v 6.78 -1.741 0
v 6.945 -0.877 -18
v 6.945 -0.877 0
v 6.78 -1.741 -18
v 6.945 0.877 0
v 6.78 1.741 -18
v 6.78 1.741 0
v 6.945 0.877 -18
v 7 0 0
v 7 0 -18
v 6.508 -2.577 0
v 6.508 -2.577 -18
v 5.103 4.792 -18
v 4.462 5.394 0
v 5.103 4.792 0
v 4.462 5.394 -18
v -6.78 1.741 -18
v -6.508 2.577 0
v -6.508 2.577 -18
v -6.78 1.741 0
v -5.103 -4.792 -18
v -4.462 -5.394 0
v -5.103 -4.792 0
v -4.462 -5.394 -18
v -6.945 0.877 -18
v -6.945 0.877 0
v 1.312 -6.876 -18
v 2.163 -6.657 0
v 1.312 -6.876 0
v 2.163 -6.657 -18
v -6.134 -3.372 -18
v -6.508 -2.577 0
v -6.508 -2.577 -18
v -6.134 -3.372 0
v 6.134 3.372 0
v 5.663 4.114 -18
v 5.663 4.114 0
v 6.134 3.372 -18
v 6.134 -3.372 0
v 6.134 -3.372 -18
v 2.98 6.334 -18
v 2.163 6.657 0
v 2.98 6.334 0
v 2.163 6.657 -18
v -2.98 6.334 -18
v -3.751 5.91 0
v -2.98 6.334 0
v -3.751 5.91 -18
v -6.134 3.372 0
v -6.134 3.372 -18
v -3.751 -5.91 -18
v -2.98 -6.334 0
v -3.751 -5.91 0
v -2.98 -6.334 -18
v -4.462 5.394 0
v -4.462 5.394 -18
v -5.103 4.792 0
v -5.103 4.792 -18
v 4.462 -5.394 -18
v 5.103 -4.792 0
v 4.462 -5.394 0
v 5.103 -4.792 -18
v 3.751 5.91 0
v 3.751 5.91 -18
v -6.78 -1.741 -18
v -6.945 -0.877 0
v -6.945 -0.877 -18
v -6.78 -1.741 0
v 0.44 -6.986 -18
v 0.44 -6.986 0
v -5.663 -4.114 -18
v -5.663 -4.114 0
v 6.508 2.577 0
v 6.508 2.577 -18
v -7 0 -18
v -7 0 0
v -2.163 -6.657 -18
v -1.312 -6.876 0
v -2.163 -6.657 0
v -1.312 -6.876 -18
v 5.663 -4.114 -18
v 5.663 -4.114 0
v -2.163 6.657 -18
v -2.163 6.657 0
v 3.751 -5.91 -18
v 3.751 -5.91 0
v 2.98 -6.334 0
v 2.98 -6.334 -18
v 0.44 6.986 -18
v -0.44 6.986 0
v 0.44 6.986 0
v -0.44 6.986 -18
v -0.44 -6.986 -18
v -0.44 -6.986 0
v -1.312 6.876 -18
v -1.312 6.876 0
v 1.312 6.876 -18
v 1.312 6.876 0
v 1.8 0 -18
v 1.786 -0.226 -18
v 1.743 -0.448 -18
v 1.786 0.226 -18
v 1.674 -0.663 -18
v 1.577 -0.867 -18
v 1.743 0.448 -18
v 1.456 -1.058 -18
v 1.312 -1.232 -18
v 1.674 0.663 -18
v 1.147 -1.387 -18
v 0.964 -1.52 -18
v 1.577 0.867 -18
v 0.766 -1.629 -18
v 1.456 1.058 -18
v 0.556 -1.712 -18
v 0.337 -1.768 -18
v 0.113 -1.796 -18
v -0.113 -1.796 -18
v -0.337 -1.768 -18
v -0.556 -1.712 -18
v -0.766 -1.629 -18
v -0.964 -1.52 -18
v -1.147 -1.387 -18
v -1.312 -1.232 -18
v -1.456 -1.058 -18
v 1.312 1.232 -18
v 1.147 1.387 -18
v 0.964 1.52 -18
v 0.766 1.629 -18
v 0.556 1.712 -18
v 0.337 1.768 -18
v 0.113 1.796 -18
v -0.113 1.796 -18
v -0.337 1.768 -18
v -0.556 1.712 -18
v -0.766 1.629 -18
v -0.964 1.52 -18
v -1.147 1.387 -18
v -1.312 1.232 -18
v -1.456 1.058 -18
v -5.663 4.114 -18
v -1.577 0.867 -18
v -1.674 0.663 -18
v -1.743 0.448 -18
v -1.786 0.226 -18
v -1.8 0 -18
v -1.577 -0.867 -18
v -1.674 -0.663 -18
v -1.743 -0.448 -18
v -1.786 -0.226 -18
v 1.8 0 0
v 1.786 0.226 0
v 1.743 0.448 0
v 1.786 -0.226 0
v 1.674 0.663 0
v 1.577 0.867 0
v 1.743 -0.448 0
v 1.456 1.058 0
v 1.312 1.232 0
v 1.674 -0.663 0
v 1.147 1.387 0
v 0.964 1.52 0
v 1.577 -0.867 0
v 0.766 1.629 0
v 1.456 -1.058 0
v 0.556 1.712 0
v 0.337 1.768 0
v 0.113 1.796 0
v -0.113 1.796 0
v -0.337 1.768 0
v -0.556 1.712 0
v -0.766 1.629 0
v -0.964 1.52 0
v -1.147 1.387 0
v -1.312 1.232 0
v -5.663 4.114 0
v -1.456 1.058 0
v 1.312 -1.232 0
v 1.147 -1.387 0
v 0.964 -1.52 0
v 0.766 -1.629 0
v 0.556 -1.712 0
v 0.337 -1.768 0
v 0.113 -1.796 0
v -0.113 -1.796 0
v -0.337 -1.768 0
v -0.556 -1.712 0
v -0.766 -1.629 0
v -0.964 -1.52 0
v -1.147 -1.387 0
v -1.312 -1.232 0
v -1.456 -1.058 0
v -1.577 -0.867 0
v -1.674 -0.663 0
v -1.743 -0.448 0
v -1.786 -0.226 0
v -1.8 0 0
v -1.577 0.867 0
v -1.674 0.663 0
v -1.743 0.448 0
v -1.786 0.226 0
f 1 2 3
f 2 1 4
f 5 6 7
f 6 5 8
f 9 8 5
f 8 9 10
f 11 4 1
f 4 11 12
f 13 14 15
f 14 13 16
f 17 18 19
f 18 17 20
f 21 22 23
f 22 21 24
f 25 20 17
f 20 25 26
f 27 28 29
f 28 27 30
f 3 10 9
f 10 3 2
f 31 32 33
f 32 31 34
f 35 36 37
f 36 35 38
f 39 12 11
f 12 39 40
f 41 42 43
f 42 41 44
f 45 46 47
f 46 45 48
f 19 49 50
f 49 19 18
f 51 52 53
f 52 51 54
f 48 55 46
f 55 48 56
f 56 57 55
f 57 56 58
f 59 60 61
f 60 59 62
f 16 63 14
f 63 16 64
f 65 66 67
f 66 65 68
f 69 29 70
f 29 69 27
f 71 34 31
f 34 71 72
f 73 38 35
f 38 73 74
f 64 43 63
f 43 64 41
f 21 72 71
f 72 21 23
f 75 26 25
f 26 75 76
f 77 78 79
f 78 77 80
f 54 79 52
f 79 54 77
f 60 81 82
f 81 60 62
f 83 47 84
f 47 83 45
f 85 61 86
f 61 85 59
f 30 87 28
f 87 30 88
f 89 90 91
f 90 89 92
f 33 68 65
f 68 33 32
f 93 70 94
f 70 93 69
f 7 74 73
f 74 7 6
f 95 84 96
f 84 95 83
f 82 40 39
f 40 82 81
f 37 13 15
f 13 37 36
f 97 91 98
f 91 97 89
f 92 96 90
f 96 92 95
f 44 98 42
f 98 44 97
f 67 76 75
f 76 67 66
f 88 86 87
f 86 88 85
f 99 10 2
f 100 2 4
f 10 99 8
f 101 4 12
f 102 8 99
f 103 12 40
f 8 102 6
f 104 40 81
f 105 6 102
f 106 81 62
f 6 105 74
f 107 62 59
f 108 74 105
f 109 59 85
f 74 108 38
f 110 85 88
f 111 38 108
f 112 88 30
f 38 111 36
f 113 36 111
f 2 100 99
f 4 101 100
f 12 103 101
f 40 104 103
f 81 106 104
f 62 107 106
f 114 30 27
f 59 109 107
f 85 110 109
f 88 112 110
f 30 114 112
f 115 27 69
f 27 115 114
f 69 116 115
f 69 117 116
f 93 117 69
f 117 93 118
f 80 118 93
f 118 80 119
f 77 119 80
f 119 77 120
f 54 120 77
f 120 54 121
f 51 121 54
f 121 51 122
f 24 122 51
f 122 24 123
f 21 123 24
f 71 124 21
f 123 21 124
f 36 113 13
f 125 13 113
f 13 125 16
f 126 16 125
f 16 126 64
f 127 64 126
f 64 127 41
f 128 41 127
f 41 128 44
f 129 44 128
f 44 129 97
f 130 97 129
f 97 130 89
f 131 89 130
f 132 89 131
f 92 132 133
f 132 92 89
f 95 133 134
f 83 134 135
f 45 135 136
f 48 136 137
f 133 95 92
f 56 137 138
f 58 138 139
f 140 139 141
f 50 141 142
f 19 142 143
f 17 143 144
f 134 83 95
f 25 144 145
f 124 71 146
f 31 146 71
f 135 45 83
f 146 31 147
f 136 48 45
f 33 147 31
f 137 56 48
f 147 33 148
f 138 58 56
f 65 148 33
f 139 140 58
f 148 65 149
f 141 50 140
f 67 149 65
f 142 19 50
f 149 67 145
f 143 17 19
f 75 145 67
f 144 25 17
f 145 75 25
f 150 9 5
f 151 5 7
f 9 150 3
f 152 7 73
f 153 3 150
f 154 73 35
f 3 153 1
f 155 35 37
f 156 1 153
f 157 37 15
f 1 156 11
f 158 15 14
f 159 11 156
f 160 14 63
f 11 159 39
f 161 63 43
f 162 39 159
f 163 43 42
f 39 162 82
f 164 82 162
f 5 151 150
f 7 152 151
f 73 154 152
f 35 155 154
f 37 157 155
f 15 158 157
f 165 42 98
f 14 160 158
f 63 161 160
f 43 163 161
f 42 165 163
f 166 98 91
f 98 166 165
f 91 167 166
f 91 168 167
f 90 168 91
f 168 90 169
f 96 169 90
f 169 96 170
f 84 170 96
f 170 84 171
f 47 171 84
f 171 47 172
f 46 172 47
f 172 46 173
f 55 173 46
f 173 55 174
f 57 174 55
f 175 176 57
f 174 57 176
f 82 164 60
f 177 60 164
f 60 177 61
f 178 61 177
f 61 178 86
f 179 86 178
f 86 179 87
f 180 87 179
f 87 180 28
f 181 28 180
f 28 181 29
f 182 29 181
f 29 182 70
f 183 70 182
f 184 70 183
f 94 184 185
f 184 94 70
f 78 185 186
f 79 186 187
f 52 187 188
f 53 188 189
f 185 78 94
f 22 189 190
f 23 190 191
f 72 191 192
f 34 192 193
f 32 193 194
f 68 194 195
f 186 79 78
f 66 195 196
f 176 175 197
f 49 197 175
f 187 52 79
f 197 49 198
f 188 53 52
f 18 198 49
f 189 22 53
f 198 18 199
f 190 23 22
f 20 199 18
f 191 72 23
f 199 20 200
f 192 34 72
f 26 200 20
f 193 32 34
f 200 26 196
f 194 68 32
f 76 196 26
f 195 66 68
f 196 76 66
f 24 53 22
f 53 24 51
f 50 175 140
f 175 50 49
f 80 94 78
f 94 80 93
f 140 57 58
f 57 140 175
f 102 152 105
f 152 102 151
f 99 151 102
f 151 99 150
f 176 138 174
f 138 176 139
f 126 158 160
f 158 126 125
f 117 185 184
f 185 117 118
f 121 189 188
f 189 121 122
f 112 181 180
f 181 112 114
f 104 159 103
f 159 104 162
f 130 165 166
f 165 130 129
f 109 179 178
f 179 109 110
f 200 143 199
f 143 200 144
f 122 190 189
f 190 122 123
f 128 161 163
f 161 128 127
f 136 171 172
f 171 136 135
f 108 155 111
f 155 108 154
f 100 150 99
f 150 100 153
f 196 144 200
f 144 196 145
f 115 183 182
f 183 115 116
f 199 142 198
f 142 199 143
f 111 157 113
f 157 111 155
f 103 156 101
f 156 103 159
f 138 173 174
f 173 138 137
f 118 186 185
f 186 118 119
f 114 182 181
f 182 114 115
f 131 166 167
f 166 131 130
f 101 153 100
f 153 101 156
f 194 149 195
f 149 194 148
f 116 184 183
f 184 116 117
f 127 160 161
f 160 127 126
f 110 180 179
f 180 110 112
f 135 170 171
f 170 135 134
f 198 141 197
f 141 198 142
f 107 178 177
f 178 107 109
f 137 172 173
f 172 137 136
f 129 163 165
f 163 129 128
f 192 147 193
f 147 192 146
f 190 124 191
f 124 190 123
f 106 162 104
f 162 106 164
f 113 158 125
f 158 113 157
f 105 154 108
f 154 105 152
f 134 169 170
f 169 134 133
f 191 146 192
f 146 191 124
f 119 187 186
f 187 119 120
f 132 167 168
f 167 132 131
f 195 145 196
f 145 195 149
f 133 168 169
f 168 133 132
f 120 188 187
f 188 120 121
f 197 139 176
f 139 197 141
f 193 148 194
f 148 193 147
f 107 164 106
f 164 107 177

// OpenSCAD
$fn = 50;


difference() {
	union() {
		translate(v = [0, 0, -18.0000000000]) {
			cylinder(h = 18, r = 7.0000000000);
		}
		cylinder(h = 0, r = 13.0000000000);
	}
	union() {
		#translate(v = [0, 0, -18]) {
			cylinder(h = 18, r = 1.8000000000);
		}
	}
}
